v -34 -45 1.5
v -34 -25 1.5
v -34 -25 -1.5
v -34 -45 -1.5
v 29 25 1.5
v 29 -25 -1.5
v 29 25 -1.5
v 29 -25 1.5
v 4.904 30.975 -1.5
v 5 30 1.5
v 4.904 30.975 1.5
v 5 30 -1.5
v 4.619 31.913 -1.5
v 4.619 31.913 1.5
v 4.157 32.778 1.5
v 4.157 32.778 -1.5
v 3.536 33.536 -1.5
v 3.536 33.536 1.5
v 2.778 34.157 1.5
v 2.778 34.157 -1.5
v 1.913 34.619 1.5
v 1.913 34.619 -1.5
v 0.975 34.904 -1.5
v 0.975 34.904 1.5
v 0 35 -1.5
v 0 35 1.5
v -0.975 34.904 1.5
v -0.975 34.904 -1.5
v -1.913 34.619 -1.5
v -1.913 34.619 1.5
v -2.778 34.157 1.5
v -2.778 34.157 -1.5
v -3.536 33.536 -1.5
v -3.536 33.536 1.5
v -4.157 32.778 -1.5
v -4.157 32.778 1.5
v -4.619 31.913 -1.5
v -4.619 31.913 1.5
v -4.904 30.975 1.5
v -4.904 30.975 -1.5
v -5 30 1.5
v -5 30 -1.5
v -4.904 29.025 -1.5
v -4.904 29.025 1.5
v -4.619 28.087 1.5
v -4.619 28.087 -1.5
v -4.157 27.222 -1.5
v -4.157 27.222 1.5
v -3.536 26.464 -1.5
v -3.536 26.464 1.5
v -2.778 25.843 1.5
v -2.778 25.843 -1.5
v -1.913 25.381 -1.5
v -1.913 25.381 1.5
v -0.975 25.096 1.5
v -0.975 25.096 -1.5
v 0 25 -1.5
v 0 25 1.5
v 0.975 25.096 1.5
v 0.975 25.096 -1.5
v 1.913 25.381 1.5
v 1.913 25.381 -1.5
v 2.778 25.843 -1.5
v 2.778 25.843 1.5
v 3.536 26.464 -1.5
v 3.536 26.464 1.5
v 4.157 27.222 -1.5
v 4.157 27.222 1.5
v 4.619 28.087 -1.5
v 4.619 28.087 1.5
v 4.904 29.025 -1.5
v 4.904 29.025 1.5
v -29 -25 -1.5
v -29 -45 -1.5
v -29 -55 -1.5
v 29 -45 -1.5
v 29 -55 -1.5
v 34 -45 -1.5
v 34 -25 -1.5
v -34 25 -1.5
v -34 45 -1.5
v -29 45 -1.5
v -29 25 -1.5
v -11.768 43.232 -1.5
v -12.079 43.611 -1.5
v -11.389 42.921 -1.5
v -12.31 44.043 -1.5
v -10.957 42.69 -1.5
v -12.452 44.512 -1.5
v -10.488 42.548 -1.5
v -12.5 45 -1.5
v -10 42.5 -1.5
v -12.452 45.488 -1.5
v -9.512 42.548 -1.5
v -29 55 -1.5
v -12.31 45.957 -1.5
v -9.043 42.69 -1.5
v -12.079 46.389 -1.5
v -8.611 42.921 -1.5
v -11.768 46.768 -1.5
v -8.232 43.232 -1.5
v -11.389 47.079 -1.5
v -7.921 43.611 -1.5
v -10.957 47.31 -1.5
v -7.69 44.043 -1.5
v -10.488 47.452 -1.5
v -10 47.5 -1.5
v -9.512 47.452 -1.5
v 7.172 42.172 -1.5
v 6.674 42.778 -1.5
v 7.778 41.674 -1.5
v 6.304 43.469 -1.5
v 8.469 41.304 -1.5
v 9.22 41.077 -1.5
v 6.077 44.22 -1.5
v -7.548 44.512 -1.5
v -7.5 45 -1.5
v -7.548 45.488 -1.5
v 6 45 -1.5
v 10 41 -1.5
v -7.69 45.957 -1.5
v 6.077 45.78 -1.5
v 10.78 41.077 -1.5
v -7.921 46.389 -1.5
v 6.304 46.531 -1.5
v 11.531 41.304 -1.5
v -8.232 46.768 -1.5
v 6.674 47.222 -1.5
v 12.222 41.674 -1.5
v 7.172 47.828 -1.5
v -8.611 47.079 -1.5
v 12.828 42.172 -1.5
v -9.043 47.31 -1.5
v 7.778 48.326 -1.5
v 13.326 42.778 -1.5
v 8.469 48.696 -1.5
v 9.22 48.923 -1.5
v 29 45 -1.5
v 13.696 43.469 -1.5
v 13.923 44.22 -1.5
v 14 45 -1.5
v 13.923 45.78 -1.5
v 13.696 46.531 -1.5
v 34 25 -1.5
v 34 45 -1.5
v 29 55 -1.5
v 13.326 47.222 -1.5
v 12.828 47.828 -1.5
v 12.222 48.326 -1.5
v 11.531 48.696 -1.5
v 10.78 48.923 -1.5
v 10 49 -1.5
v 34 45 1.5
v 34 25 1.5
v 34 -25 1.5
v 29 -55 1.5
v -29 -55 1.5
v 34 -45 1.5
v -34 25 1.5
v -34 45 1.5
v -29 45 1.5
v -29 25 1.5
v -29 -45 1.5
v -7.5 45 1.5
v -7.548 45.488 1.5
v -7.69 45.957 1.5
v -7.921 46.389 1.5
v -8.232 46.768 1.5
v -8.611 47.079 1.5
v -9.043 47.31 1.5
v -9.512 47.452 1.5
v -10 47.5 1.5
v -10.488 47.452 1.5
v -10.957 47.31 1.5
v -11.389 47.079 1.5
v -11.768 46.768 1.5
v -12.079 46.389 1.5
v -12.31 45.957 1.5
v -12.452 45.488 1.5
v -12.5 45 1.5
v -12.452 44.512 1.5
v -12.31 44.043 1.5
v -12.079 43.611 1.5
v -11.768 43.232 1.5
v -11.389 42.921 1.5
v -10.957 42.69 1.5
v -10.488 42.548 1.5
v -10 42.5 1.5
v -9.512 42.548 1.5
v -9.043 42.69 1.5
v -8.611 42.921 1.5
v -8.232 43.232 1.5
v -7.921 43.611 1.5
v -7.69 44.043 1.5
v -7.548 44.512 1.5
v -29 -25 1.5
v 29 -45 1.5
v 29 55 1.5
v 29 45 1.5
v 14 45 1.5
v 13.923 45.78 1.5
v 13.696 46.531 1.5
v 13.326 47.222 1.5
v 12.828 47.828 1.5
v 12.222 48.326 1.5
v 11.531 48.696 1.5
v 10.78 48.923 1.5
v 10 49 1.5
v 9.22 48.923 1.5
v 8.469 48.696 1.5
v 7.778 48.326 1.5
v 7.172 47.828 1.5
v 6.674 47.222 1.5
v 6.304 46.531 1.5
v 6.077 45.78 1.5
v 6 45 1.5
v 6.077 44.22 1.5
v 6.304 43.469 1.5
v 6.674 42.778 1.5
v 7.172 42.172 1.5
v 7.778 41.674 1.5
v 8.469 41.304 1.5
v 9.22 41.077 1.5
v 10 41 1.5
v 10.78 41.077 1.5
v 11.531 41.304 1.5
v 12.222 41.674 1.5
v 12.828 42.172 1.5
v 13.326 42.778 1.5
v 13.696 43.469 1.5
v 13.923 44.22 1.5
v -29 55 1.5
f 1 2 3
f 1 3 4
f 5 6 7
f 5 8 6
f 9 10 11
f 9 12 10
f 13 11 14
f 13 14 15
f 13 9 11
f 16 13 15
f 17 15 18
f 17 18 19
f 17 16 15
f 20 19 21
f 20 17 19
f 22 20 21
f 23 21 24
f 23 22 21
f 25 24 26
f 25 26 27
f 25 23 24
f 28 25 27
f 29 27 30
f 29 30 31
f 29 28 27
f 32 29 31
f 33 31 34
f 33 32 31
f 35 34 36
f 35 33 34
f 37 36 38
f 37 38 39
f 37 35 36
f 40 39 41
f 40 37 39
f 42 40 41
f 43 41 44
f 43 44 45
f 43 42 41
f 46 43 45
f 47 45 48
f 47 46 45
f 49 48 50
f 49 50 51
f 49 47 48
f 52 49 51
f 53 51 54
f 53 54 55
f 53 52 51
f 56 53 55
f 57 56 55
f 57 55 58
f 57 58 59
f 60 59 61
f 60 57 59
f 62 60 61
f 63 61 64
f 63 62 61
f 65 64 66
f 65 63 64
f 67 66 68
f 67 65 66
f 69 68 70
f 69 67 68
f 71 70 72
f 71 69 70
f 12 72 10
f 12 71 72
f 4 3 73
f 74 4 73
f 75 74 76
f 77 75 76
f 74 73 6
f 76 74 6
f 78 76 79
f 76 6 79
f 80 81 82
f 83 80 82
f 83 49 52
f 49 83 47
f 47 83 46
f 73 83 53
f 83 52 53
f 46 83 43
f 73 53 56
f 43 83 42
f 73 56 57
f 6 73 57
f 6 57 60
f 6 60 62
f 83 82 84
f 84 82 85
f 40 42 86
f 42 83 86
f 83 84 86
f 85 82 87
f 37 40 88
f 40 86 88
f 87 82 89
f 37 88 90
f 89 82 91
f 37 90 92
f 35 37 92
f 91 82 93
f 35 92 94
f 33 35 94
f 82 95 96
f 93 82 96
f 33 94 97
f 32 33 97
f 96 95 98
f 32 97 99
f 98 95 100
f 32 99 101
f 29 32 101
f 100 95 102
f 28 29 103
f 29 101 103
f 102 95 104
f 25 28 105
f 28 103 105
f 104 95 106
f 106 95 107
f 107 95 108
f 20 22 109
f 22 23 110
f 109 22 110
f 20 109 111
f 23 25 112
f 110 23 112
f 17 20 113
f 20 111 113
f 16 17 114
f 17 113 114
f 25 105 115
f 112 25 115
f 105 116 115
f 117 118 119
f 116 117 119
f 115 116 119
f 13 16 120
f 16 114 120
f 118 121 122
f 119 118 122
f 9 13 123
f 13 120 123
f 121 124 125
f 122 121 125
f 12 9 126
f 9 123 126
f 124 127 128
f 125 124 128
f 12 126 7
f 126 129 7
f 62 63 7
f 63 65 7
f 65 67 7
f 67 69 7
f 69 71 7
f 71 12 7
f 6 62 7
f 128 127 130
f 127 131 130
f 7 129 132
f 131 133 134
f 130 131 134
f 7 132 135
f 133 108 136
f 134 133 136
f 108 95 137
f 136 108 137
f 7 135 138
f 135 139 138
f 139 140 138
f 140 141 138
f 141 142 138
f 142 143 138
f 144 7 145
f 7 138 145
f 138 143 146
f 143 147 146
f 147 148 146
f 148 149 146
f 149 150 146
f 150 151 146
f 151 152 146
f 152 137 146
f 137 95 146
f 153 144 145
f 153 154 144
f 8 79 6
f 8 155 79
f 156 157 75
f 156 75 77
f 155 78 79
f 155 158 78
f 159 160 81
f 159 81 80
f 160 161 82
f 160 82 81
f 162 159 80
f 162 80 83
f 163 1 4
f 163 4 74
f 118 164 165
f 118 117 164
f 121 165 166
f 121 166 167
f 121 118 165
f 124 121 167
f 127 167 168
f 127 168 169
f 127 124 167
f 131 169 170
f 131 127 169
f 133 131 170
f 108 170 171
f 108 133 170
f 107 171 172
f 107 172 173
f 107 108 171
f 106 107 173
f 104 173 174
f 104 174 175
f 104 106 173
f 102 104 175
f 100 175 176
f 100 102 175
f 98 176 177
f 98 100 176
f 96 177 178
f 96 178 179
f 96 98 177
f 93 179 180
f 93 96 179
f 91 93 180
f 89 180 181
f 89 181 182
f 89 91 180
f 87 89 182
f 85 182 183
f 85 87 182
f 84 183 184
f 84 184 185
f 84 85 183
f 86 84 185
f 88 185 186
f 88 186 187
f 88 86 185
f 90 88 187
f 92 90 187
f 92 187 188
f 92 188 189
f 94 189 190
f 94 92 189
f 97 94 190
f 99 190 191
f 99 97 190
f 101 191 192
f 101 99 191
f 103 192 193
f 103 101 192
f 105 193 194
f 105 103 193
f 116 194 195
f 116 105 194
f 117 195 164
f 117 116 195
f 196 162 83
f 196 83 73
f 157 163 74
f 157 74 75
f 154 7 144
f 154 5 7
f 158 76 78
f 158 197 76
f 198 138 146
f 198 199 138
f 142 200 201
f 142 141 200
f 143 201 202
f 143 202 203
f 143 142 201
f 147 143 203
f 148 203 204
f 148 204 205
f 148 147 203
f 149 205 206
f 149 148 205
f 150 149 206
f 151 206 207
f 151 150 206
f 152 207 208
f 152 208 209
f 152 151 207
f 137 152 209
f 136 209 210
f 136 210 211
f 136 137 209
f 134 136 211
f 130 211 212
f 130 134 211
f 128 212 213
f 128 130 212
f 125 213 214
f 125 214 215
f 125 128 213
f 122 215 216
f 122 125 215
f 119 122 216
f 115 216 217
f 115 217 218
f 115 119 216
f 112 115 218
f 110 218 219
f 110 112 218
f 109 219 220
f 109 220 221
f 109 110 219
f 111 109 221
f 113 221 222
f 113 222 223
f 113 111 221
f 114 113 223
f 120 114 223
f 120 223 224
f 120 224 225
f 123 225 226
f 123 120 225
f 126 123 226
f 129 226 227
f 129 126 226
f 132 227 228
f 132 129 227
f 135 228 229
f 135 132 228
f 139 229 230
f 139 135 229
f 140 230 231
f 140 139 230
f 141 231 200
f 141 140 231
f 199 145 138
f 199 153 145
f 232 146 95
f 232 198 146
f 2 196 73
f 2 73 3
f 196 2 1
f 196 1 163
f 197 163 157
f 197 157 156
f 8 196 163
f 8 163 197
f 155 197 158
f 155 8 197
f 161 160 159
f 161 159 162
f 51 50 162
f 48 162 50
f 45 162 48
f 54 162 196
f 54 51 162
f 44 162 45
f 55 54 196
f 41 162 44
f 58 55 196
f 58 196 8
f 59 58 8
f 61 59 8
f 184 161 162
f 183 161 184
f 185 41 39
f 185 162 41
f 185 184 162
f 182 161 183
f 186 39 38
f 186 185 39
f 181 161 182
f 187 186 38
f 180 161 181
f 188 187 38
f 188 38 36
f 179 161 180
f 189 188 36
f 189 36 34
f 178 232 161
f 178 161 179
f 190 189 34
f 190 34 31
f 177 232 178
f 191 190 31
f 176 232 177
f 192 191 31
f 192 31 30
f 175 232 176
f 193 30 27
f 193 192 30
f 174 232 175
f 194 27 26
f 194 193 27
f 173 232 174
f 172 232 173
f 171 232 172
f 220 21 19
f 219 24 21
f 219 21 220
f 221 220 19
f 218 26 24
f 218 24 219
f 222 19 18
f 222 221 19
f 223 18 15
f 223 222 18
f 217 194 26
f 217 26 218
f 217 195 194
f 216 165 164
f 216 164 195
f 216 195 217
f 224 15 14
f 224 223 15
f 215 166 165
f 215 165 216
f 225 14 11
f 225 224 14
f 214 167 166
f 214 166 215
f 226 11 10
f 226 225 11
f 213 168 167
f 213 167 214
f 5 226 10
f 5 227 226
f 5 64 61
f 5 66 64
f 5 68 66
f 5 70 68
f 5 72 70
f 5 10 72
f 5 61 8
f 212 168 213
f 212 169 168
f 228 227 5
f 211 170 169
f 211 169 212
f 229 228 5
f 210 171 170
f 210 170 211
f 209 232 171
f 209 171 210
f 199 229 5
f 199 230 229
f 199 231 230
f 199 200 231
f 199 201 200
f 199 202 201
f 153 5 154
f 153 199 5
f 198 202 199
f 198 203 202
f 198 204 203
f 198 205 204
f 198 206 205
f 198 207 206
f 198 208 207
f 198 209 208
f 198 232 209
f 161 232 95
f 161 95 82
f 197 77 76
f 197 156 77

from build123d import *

# Parameters (mm, degrees)
F0_R     = 2.5
F0_R_2   = 5
F0_R_3   = 4
F1_DEPTH = 1.5


with BuildPart() as f1:
    # F0 (on Top) → F1 (new body, symmetric)
    with BuildSketch(Plane.XY):
        Polygon((29, 55), (-29, 55), (-29, 45), (-34, 45), (-34, 25), (-29, 25), (-29, -25), (-34, -25), (-34, -45), (-29, -45), (-29, -55), (29, -55), (29, -45), (34, -45), (34, -25), (29, -25), (29, 25), (34, 25), (34, 45), (29, 45), align=None)
        with Locations((-10, 45)):
            Circle(F0_R, mode=Mode.SUBTRACT)
        with Locations((0, 30)):
            Circle(F0_R_2, mode=Mode.SUBTRACT)
        with Locations((10, 45)):
            Circle(F0_R_3, mode=Mode.SUBTRACT)
    extrude(amount=F1_DEPTH, both=True)


solid = f1.part
